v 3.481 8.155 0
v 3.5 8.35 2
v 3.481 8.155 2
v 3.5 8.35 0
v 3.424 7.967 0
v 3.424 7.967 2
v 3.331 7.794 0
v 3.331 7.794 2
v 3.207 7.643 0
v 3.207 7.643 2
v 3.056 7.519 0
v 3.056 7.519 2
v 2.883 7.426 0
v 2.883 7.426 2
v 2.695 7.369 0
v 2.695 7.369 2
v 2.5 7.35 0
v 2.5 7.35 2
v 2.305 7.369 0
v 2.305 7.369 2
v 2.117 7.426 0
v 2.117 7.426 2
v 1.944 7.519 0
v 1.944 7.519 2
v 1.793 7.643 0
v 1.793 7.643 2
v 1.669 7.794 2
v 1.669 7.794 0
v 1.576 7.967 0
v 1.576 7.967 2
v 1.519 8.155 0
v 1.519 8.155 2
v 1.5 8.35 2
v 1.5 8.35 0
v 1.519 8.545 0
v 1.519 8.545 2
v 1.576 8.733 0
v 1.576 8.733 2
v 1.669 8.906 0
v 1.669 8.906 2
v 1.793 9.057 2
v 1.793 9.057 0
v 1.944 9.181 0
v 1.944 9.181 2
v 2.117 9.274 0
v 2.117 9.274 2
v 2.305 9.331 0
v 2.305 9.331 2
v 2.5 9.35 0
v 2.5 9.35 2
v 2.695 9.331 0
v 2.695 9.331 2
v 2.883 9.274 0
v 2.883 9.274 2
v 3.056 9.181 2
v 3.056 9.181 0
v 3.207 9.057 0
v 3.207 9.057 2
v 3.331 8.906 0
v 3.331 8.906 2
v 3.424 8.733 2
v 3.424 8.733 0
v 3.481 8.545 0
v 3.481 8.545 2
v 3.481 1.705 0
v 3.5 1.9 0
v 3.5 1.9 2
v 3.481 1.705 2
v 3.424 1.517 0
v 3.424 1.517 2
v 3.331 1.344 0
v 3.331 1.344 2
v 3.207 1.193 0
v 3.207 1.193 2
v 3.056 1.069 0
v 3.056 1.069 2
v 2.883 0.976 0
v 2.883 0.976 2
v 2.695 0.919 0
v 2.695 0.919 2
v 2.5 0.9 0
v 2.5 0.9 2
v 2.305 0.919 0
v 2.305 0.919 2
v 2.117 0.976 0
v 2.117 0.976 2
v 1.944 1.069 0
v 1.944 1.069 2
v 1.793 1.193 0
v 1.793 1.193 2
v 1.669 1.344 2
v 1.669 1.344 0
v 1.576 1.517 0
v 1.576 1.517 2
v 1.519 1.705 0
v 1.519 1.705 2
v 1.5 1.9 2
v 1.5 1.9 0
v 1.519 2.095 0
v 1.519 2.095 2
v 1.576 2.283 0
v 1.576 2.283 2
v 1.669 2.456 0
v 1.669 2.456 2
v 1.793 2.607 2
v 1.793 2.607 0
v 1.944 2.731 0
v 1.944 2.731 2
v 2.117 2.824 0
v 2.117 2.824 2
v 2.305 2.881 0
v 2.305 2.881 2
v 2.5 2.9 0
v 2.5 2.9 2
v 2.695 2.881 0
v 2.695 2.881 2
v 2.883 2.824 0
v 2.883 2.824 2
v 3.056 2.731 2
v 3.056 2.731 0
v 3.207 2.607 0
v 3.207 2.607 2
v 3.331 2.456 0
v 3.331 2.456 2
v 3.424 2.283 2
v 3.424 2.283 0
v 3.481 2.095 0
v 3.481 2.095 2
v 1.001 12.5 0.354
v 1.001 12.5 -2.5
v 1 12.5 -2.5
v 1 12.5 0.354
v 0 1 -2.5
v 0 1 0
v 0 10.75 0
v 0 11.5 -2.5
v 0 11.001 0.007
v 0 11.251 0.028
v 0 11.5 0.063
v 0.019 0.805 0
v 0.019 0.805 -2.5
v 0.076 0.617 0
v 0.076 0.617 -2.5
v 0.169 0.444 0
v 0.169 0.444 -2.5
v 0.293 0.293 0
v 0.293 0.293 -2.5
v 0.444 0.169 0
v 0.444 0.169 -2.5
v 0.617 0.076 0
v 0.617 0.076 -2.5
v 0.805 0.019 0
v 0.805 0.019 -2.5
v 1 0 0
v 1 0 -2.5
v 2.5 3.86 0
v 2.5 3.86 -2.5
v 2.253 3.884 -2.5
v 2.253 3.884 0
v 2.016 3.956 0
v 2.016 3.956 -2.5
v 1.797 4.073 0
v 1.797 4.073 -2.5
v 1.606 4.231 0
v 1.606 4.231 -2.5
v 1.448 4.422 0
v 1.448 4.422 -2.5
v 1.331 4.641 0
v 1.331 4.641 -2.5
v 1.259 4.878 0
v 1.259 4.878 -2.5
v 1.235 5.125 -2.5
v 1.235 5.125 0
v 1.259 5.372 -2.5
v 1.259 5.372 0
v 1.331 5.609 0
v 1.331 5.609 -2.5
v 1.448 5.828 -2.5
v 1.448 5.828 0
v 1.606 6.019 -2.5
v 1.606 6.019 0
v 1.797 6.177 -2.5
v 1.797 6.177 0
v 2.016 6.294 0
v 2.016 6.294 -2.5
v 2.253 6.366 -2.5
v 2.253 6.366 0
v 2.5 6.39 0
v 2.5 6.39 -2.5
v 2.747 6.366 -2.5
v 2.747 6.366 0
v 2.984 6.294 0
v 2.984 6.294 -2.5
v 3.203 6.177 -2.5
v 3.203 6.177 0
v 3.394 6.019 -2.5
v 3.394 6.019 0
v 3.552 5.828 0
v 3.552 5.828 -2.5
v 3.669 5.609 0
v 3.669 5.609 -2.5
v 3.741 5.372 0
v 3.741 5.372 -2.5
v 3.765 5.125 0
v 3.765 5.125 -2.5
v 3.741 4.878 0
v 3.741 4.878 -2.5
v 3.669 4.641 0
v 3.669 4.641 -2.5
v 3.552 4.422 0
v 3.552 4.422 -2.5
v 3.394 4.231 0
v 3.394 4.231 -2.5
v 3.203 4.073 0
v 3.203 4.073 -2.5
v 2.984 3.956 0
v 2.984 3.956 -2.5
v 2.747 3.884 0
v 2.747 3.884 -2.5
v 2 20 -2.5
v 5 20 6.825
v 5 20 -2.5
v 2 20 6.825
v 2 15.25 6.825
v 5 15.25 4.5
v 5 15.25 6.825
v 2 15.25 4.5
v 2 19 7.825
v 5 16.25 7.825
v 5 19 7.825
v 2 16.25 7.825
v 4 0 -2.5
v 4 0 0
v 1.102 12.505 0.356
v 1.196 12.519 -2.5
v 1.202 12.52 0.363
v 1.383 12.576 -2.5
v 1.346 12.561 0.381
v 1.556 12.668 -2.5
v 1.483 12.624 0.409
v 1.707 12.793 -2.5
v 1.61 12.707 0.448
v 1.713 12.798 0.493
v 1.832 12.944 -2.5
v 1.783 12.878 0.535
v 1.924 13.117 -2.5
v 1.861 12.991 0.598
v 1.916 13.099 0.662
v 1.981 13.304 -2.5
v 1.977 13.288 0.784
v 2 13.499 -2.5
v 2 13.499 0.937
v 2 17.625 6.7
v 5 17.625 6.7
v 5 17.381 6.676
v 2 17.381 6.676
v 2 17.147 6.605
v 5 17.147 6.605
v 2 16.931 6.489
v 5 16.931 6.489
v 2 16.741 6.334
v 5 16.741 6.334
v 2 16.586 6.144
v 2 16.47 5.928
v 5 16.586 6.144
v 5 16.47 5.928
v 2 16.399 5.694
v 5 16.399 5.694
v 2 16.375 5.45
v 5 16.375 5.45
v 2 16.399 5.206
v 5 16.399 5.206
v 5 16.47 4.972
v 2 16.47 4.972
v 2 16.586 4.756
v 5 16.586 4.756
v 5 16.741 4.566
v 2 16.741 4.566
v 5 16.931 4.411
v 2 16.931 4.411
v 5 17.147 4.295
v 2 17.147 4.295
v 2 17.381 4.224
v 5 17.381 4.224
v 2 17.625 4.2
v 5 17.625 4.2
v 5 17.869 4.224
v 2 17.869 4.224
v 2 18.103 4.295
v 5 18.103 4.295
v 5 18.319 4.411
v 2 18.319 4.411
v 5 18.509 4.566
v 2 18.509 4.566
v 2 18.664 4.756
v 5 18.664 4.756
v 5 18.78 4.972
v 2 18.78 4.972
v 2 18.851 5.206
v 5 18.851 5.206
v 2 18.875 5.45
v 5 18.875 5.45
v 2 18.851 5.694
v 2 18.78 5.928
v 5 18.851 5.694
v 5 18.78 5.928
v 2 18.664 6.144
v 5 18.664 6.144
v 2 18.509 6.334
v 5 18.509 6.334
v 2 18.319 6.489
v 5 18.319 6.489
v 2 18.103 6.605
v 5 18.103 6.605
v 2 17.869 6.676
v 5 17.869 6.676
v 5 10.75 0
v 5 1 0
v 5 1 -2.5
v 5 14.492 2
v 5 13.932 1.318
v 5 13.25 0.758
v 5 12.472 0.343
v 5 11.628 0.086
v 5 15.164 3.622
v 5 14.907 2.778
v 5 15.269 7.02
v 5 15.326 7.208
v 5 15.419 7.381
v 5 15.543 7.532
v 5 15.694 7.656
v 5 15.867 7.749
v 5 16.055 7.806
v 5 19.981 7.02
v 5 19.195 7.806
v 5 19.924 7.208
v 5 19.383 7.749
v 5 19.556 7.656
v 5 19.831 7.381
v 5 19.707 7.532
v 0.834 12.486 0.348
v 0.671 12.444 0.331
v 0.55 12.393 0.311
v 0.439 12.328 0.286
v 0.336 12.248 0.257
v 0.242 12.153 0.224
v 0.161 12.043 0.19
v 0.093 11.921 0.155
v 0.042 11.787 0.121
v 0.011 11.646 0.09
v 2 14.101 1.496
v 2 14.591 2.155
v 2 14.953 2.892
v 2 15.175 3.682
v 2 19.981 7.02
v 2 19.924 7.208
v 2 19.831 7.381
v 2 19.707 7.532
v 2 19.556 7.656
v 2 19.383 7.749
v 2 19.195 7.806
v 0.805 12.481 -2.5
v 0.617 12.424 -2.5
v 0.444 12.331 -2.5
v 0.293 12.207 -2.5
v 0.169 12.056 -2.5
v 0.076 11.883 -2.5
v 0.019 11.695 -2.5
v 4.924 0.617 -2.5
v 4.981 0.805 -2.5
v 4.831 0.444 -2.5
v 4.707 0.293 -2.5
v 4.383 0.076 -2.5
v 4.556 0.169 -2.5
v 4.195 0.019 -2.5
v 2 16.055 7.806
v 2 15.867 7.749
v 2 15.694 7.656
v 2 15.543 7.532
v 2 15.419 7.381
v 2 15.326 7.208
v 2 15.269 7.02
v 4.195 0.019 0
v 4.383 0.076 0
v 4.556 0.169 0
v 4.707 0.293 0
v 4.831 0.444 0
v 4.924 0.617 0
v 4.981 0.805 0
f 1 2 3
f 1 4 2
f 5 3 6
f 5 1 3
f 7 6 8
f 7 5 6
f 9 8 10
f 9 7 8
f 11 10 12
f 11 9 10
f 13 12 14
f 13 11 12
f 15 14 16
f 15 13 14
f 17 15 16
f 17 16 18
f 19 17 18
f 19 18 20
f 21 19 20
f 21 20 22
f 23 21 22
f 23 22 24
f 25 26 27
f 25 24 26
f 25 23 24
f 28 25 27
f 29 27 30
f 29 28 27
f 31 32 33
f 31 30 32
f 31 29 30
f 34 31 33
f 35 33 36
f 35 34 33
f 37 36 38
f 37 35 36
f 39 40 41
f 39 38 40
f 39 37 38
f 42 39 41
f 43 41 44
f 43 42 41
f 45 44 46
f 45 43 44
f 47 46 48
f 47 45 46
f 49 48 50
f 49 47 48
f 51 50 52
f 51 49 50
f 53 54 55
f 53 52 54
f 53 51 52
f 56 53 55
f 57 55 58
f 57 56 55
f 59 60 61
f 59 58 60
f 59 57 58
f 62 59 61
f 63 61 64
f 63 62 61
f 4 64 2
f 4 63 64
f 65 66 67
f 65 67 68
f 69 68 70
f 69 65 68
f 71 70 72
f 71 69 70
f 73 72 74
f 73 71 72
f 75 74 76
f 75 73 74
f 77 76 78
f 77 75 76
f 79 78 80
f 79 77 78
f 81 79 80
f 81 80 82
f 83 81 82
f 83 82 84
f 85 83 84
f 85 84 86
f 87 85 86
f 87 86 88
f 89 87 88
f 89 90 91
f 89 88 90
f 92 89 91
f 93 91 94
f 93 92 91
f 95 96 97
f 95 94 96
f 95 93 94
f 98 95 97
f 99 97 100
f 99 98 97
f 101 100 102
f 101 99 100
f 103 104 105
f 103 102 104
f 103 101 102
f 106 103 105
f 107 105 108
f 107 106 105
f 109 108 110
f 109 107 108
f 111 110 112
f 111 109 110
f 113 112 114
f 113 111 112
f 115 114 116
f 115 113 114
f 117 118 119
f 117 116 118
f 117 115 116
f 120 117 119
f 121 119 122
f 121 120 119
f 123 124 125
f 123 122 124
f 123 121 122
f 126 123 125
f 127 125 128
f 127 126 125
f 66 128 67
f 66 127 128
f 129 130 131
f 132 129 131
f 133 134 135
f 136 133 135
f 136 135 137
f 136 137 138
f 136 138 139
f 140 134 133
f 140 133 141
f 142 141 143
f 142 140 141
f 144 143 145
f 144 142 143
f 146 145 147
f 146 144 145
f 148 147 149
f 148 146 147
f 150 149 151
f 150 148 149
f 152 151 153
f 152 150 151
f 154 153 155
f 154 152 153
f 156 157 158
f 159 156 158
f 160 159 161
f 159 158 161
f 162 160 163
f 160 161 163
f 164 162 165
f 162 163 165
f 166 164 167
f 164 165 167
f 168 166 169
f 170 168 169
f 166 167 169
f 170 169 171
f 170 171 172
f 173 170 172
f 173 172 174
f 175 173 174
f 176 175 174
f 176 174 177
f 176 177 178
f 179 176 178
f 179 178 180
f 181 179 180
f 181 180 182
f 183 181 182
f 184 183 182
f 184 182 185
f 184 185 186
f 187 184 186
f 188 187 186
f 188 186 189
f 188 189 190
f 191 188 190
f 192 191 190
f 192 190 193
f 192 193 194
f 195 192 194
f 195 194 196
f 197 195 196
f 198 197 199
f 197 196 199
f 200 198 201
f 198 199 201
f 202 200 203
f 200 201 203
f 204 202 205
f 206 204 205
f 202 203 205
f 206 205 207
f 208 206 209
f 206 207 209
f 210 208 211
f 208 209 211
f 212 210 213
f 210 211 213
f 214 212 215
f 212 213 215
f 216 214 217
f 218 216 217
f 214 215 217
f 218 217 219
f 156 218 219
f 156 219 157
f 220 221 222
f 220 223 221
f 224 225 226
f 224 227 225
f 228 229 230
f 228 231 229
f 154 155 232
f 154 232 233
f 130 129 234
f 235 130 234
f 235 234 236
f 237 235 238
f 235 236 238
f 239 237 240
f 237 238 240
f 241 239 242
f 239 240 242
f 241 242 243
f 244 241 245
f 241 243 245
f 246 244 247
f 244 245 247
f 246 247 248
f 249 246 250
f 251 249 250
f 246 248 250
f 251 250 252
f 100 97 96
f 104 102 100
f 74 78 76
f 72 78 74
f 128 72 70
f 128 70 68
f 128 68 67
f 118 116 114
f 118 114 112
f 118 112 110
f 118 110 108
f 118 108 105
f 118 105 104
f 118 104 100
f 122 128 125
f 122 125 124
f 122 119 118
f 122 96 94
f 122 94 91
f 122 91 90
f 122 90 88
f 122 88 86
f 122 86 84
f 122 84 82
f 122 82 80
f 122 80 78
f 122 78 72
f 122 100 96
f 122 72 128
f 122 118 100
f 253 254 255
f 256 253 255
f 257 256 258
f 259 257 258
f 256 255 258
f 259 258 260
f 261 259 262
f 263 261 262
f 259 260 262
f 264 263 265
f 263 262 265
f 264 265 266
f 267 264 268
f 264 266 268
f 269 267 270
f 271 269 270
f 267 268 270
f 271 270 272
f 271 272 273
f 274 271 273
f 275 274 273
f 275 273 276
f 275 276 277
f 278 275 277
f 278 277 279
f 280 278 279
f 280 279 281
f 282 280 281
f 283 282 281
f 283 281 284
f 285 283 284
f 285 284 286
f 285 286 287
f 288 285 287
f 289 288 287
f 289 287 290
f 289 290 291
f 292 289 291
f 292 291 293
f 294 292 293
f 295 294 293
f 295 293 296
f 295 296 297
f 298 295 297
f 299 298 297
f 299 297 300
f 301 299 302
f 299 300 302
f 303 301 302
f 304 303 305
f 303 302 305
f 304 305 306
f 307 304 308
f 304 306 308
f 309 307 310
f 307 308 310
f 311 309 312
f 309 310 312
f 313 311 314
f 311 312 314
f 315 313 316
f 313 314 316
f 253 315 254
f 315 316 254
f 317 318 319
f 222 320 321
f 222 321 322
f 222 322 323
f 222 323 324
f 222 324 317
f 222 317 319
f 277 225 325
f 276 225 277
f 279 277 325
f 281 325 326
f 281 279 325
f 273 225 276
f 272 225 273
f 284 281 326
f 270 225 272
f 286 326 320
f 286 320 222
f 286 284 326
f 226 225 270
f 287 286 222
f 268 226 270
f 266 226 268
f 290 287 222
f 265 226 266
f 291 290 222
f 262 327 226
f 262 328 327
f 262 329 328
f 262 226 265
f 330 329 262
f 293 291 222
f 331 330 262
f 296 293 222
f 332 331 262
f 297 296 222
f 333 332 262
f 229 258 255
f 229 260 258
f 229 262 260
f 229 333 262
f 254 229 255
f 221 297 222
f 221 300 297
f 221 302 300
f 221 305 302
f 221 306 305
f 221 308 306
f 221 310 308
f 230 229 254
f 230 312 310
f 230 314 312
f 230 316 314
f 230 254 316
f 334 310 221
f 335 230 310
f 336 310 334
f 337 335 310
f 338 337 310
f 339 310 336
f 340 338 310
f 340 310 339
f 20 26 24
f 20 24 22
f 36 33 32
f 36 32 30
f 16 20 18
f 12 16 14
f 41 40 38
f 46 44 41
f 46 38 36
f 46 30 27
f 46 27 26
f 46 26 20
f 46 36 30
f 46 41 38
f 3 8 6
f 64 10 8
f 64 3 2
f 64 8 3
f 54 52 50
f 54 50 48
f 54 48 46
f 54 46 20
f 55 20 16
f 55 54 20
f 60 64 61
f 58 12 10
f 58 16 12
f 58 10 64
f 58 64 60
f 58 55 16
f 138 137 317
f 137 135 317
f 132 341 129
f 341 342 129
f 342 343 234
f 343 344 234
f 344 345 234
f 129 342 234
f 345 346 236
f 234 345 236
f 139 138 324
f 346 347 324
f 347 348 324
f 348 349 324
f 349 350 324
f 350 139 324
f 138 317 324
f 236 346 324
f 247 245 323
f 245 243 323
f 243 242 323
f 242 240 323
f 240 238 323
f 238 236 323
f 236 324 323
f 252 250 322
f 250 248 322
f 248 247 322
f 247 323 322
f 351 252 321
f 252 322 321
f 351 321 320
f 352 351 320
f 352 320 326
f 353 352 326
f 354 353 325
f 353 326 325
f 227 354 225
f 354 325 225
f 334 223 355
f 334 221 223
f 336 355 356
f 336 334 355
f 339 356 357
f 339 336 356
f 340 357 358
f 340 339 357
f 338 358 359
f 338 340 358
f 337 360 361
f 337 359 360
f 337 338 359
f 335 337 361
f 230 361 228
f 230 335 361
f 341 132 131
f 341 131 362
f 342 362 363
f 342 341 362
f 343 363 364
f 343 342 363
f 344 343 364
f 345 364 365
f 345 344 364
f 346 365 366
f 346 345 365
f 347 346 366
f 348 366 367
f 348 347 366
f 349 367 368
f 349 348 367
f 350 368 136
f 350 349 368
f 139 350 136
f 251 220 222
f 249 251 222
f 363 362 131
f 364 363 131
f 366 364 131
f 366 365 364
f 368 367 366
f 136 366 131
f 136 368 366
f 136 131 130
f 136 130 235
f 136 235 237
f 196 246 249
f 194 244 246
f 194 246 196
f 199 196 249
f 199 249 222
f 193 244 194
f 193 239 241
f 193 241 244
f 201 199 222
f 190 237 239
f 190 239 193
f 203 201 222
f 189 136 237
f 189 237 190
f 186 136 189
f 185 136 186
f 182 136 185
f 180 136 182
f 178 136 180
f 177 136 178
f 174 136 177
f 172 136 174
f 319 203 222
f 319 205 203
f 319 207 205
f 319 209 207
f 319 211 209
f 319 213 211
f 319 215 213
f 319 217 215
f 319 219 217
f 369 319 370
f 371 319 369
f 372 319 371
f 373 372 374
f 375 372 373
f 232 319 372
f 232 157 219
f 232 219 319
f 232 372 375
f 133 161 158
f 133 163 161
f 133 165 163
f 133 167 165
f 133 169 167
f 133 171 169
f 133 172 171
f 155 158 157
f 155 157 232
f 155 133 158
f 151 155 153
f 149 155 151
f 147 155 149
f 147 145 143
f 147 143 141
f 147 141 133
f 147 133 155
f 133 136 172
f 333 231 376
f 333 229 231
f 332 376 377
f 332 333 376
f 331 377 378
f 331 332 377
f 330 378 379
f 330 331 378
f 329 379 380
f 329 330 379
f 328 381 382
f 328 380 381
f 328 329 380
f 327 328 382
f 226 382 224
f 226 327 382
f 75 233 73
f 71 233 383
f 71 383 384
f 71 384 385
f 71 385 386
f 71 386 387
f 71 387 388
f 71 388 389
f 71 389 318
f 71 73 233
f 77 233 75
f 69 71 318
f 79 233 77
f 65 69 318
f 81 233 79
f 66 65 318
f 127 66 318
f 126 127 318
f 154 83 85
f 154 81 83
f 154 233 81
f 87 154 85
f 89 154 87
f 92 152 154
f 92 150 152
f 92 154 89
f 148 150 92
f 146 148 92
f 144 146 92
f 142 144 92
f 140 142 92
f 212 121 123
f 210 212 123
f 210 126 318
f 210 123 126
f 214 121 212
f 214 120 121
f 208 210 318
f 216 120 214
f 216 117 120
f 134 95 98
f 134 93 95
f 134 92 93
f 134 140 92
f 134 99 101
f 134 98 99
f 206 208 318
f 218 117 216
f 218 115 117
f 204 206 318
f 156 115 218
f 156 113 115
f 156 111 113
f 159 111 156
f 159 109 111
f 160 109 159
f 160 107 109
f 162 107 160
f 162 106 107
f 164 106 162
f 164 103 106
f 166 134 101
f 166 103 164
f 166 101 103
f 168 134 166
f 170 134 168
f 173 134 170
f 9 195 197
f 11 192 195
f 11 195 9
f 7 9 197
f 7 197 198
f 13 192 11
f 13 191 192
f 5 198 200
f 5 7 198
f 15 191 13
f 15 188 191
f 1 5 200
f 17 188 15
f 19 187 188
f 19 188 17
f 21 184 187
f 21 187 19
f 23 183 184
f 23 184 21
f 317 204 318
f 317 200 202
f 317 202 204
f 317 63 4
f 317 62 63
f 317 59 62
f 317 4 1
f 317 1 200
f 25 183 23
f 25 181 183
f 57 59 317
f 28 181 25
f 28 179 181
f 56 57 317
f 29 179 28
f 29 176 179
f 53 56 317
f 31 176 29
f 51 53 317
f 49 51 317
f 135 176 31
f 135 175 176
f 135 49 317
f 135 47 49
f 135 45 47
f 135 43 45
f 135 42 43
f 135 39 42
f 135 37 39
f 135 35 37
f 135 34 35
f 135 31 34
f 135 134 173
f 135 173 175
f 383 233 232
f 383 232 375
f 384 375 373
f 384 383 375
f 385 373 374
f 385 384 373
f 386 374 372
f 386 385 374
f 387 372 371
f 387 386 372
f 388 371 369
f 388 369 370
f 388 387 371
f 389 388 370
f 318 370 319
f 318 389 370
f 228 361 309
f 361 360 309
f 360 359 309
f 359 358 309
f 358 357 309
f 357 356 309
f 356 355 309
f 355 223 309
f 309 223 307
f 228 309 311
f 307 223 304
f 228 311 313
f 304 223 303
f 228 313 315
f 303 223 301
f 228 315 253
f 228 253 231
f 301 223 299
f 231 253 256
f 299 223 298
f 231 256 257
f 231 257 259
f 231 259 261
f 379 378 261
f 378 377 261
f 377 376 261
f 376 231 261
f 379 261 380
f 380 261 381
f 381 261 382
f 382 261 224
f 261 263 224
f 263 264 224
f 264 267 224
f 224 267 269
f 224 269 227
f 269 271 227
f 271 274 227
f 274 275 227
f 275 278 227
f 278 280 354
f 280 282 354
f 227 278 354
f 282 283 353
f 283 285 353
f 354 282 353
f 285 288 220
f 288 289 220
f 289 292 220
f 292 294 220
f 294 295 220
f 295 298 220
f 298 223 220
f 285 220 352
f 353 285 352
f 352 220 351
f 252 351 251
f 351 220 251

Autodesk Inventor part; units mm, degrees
ref_plane "YZ Plane" through (0, 0, 0) normal (1, 0, 0) x (0, 1, 0)
ref_plane "XZ Plane" through (0, 0, 0) normal (0, 1, 0) x (-1, 0, 0)
ref_plane "XY Plane" through (0, 0, 0) normal (0, 0, 1) x (1, 0, 0)
sketch "Sketch1" plane through (0, 0, 0) normal (1, 0, 0) x (0, 1, 0)
  line L0 (0, 0) -> (15.25, 0)
  line L1 (15.25, 0) -> (15.25, 7.825)
  line L2 (15.25, 7.825) -> (20, 7.825)
  line L3 (20, 7.825) -> (20, -2.5)
  line L4 (20, -2.5) -> (0, -2.5)
  line L5 (0, -2.5) -> (0, 0)
  point P0 (17.625, 5.45)
  dimension "d8" = 2.5
  dimension "d21" = 5.45
  dimension "d23" = 20
  dimension "d24" = 2.375
  dimension "d25" = 2.375
  dimension "d26" = 2.375
extrude "Extrusion1" add sketch "Sketch1" along normal blind 5
sketch "Sketch2" plane through (0, 0, 0) normal (0, 0, 1) x (1, 0, 0)
  line L0 (2.5, 1.9) -> (2.5, 8.35) construction
  line L1 (5, 15.25) -> (5, 0) construction
  line L2 (0, 0) -> (0, 15.25) construction
  circle A0 centre (2.5, 8.35) radius 1
  circle A1 centre (2.5, 1.9) radius 1
  line L3 (0, 0) -> (5, 0) projected
  line L4 (0, 15.25) -> (5, 15.25) projected
  point P0 (2.5, 5.125)
  dimension "d2" = 5
  dimension "d3" = 2.5
  dimension "d4" = 8.45
  dimension "d5" = 2
  dimension "d6" = 2
  dimension "d27" = 5.125
extrude "Extrusion2" add sketch "Sketch2" along normal blind 2
hole "Hole1" at (2.5, 5.125, 0) direction (0, 0, -1) diameter 2.53 end through all
fillet "Fillet1" radius 1 2 edges at (5, 0, -1.25) (0, 0, -1.25)
sketch "Sketch3" plane through (5, 20, -2.5) normal (0, 0, -1) x (-1, 0, 0)
  line L0 (5, 0) -> (5, -19) projected
  line L1 (5, 0) -> (3, 0)
  line L2 (3, 0) -> (3, -7.5)
  line L3 (3, -7.5) -> (5, -7.5)
  line L4 (5, -7.5) -> (5, 0)
  line L5 (0, -19) -> (0, 0) projected
  point P0 (5, -20)
  dimension "d28" = 3
  dimension "d29" = 7.5
extrude "Extrusion3" cut sketch "Sketch3" against normal up to surface (10.325 mm away)
hole "Hole2" at (0, 17.625, 5.45) direction (1, 0, 0) diameter 2.5 end through all
fillet "Fillet2" radius 1 4 edges at (0, 12.5, -1.25) (2, 12.5, -1.25) (3.5, 15.25, 7.825) (3.5, 20, 7.825)
fillet "Fillet2" radius 4.5 1 edges at (3.5, 15.25, 0)
equation "\"d26\" = d24"
equation "\"d3\" = 0.5 * d2"
equation "\"d6\" = d5"
properties part number "BR"
